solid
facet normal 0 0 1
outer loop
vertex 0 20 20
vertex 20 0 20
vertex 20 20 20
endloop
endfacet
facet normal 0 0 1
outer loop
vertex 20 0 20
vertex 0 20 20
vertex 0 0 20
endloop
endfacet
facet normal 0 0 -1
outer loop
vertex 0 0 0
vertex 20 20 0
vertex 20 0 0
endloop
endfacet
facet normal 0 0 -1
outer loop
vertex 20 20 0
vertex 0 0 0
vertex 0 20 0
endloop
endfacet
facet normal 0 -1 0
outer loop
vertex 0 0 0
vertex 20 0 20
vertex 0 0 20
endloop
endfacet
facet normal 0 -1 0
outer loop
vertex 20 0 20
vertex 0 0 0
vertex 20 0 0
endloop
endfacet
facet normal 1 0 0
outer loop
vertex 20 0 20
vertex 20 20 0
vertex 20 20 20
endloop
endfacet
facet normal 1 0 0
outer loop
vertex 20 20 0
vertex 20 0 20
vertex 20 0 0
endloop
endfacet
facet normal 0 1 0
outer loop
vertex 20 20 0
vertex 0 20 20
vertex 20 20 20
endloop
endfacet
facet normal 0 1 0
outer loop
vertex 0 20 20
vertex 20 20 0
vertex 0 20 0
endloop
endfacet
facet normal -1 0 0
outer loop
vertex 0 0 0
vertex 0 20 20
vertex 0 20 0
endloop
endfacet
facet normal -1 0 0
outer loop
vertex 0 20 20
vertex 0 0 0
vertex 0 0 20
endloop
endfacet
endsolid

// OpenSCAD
// Customizer annotations in a file with CRLF line endings, see #7173.
// Keep the CRLF line endings, see .gitattributes.

/* [Drop down boxes] */

// combo box for string
side = "Left"; // [Left, Right]

// labeled combo box for numbers
size = 20; // [10:S, 20:M, 30:L]

/* [Sliders] */

// slider widget for number in range
width = 20; // [10:100]

// step slider for number
step = 5; // [0:5:100]

/* [Other] */

// spinbox with step size 0.5
spinbox = 5.5; // .5

// text box for string with length 8
label = "length"; // 8

cube(width);
